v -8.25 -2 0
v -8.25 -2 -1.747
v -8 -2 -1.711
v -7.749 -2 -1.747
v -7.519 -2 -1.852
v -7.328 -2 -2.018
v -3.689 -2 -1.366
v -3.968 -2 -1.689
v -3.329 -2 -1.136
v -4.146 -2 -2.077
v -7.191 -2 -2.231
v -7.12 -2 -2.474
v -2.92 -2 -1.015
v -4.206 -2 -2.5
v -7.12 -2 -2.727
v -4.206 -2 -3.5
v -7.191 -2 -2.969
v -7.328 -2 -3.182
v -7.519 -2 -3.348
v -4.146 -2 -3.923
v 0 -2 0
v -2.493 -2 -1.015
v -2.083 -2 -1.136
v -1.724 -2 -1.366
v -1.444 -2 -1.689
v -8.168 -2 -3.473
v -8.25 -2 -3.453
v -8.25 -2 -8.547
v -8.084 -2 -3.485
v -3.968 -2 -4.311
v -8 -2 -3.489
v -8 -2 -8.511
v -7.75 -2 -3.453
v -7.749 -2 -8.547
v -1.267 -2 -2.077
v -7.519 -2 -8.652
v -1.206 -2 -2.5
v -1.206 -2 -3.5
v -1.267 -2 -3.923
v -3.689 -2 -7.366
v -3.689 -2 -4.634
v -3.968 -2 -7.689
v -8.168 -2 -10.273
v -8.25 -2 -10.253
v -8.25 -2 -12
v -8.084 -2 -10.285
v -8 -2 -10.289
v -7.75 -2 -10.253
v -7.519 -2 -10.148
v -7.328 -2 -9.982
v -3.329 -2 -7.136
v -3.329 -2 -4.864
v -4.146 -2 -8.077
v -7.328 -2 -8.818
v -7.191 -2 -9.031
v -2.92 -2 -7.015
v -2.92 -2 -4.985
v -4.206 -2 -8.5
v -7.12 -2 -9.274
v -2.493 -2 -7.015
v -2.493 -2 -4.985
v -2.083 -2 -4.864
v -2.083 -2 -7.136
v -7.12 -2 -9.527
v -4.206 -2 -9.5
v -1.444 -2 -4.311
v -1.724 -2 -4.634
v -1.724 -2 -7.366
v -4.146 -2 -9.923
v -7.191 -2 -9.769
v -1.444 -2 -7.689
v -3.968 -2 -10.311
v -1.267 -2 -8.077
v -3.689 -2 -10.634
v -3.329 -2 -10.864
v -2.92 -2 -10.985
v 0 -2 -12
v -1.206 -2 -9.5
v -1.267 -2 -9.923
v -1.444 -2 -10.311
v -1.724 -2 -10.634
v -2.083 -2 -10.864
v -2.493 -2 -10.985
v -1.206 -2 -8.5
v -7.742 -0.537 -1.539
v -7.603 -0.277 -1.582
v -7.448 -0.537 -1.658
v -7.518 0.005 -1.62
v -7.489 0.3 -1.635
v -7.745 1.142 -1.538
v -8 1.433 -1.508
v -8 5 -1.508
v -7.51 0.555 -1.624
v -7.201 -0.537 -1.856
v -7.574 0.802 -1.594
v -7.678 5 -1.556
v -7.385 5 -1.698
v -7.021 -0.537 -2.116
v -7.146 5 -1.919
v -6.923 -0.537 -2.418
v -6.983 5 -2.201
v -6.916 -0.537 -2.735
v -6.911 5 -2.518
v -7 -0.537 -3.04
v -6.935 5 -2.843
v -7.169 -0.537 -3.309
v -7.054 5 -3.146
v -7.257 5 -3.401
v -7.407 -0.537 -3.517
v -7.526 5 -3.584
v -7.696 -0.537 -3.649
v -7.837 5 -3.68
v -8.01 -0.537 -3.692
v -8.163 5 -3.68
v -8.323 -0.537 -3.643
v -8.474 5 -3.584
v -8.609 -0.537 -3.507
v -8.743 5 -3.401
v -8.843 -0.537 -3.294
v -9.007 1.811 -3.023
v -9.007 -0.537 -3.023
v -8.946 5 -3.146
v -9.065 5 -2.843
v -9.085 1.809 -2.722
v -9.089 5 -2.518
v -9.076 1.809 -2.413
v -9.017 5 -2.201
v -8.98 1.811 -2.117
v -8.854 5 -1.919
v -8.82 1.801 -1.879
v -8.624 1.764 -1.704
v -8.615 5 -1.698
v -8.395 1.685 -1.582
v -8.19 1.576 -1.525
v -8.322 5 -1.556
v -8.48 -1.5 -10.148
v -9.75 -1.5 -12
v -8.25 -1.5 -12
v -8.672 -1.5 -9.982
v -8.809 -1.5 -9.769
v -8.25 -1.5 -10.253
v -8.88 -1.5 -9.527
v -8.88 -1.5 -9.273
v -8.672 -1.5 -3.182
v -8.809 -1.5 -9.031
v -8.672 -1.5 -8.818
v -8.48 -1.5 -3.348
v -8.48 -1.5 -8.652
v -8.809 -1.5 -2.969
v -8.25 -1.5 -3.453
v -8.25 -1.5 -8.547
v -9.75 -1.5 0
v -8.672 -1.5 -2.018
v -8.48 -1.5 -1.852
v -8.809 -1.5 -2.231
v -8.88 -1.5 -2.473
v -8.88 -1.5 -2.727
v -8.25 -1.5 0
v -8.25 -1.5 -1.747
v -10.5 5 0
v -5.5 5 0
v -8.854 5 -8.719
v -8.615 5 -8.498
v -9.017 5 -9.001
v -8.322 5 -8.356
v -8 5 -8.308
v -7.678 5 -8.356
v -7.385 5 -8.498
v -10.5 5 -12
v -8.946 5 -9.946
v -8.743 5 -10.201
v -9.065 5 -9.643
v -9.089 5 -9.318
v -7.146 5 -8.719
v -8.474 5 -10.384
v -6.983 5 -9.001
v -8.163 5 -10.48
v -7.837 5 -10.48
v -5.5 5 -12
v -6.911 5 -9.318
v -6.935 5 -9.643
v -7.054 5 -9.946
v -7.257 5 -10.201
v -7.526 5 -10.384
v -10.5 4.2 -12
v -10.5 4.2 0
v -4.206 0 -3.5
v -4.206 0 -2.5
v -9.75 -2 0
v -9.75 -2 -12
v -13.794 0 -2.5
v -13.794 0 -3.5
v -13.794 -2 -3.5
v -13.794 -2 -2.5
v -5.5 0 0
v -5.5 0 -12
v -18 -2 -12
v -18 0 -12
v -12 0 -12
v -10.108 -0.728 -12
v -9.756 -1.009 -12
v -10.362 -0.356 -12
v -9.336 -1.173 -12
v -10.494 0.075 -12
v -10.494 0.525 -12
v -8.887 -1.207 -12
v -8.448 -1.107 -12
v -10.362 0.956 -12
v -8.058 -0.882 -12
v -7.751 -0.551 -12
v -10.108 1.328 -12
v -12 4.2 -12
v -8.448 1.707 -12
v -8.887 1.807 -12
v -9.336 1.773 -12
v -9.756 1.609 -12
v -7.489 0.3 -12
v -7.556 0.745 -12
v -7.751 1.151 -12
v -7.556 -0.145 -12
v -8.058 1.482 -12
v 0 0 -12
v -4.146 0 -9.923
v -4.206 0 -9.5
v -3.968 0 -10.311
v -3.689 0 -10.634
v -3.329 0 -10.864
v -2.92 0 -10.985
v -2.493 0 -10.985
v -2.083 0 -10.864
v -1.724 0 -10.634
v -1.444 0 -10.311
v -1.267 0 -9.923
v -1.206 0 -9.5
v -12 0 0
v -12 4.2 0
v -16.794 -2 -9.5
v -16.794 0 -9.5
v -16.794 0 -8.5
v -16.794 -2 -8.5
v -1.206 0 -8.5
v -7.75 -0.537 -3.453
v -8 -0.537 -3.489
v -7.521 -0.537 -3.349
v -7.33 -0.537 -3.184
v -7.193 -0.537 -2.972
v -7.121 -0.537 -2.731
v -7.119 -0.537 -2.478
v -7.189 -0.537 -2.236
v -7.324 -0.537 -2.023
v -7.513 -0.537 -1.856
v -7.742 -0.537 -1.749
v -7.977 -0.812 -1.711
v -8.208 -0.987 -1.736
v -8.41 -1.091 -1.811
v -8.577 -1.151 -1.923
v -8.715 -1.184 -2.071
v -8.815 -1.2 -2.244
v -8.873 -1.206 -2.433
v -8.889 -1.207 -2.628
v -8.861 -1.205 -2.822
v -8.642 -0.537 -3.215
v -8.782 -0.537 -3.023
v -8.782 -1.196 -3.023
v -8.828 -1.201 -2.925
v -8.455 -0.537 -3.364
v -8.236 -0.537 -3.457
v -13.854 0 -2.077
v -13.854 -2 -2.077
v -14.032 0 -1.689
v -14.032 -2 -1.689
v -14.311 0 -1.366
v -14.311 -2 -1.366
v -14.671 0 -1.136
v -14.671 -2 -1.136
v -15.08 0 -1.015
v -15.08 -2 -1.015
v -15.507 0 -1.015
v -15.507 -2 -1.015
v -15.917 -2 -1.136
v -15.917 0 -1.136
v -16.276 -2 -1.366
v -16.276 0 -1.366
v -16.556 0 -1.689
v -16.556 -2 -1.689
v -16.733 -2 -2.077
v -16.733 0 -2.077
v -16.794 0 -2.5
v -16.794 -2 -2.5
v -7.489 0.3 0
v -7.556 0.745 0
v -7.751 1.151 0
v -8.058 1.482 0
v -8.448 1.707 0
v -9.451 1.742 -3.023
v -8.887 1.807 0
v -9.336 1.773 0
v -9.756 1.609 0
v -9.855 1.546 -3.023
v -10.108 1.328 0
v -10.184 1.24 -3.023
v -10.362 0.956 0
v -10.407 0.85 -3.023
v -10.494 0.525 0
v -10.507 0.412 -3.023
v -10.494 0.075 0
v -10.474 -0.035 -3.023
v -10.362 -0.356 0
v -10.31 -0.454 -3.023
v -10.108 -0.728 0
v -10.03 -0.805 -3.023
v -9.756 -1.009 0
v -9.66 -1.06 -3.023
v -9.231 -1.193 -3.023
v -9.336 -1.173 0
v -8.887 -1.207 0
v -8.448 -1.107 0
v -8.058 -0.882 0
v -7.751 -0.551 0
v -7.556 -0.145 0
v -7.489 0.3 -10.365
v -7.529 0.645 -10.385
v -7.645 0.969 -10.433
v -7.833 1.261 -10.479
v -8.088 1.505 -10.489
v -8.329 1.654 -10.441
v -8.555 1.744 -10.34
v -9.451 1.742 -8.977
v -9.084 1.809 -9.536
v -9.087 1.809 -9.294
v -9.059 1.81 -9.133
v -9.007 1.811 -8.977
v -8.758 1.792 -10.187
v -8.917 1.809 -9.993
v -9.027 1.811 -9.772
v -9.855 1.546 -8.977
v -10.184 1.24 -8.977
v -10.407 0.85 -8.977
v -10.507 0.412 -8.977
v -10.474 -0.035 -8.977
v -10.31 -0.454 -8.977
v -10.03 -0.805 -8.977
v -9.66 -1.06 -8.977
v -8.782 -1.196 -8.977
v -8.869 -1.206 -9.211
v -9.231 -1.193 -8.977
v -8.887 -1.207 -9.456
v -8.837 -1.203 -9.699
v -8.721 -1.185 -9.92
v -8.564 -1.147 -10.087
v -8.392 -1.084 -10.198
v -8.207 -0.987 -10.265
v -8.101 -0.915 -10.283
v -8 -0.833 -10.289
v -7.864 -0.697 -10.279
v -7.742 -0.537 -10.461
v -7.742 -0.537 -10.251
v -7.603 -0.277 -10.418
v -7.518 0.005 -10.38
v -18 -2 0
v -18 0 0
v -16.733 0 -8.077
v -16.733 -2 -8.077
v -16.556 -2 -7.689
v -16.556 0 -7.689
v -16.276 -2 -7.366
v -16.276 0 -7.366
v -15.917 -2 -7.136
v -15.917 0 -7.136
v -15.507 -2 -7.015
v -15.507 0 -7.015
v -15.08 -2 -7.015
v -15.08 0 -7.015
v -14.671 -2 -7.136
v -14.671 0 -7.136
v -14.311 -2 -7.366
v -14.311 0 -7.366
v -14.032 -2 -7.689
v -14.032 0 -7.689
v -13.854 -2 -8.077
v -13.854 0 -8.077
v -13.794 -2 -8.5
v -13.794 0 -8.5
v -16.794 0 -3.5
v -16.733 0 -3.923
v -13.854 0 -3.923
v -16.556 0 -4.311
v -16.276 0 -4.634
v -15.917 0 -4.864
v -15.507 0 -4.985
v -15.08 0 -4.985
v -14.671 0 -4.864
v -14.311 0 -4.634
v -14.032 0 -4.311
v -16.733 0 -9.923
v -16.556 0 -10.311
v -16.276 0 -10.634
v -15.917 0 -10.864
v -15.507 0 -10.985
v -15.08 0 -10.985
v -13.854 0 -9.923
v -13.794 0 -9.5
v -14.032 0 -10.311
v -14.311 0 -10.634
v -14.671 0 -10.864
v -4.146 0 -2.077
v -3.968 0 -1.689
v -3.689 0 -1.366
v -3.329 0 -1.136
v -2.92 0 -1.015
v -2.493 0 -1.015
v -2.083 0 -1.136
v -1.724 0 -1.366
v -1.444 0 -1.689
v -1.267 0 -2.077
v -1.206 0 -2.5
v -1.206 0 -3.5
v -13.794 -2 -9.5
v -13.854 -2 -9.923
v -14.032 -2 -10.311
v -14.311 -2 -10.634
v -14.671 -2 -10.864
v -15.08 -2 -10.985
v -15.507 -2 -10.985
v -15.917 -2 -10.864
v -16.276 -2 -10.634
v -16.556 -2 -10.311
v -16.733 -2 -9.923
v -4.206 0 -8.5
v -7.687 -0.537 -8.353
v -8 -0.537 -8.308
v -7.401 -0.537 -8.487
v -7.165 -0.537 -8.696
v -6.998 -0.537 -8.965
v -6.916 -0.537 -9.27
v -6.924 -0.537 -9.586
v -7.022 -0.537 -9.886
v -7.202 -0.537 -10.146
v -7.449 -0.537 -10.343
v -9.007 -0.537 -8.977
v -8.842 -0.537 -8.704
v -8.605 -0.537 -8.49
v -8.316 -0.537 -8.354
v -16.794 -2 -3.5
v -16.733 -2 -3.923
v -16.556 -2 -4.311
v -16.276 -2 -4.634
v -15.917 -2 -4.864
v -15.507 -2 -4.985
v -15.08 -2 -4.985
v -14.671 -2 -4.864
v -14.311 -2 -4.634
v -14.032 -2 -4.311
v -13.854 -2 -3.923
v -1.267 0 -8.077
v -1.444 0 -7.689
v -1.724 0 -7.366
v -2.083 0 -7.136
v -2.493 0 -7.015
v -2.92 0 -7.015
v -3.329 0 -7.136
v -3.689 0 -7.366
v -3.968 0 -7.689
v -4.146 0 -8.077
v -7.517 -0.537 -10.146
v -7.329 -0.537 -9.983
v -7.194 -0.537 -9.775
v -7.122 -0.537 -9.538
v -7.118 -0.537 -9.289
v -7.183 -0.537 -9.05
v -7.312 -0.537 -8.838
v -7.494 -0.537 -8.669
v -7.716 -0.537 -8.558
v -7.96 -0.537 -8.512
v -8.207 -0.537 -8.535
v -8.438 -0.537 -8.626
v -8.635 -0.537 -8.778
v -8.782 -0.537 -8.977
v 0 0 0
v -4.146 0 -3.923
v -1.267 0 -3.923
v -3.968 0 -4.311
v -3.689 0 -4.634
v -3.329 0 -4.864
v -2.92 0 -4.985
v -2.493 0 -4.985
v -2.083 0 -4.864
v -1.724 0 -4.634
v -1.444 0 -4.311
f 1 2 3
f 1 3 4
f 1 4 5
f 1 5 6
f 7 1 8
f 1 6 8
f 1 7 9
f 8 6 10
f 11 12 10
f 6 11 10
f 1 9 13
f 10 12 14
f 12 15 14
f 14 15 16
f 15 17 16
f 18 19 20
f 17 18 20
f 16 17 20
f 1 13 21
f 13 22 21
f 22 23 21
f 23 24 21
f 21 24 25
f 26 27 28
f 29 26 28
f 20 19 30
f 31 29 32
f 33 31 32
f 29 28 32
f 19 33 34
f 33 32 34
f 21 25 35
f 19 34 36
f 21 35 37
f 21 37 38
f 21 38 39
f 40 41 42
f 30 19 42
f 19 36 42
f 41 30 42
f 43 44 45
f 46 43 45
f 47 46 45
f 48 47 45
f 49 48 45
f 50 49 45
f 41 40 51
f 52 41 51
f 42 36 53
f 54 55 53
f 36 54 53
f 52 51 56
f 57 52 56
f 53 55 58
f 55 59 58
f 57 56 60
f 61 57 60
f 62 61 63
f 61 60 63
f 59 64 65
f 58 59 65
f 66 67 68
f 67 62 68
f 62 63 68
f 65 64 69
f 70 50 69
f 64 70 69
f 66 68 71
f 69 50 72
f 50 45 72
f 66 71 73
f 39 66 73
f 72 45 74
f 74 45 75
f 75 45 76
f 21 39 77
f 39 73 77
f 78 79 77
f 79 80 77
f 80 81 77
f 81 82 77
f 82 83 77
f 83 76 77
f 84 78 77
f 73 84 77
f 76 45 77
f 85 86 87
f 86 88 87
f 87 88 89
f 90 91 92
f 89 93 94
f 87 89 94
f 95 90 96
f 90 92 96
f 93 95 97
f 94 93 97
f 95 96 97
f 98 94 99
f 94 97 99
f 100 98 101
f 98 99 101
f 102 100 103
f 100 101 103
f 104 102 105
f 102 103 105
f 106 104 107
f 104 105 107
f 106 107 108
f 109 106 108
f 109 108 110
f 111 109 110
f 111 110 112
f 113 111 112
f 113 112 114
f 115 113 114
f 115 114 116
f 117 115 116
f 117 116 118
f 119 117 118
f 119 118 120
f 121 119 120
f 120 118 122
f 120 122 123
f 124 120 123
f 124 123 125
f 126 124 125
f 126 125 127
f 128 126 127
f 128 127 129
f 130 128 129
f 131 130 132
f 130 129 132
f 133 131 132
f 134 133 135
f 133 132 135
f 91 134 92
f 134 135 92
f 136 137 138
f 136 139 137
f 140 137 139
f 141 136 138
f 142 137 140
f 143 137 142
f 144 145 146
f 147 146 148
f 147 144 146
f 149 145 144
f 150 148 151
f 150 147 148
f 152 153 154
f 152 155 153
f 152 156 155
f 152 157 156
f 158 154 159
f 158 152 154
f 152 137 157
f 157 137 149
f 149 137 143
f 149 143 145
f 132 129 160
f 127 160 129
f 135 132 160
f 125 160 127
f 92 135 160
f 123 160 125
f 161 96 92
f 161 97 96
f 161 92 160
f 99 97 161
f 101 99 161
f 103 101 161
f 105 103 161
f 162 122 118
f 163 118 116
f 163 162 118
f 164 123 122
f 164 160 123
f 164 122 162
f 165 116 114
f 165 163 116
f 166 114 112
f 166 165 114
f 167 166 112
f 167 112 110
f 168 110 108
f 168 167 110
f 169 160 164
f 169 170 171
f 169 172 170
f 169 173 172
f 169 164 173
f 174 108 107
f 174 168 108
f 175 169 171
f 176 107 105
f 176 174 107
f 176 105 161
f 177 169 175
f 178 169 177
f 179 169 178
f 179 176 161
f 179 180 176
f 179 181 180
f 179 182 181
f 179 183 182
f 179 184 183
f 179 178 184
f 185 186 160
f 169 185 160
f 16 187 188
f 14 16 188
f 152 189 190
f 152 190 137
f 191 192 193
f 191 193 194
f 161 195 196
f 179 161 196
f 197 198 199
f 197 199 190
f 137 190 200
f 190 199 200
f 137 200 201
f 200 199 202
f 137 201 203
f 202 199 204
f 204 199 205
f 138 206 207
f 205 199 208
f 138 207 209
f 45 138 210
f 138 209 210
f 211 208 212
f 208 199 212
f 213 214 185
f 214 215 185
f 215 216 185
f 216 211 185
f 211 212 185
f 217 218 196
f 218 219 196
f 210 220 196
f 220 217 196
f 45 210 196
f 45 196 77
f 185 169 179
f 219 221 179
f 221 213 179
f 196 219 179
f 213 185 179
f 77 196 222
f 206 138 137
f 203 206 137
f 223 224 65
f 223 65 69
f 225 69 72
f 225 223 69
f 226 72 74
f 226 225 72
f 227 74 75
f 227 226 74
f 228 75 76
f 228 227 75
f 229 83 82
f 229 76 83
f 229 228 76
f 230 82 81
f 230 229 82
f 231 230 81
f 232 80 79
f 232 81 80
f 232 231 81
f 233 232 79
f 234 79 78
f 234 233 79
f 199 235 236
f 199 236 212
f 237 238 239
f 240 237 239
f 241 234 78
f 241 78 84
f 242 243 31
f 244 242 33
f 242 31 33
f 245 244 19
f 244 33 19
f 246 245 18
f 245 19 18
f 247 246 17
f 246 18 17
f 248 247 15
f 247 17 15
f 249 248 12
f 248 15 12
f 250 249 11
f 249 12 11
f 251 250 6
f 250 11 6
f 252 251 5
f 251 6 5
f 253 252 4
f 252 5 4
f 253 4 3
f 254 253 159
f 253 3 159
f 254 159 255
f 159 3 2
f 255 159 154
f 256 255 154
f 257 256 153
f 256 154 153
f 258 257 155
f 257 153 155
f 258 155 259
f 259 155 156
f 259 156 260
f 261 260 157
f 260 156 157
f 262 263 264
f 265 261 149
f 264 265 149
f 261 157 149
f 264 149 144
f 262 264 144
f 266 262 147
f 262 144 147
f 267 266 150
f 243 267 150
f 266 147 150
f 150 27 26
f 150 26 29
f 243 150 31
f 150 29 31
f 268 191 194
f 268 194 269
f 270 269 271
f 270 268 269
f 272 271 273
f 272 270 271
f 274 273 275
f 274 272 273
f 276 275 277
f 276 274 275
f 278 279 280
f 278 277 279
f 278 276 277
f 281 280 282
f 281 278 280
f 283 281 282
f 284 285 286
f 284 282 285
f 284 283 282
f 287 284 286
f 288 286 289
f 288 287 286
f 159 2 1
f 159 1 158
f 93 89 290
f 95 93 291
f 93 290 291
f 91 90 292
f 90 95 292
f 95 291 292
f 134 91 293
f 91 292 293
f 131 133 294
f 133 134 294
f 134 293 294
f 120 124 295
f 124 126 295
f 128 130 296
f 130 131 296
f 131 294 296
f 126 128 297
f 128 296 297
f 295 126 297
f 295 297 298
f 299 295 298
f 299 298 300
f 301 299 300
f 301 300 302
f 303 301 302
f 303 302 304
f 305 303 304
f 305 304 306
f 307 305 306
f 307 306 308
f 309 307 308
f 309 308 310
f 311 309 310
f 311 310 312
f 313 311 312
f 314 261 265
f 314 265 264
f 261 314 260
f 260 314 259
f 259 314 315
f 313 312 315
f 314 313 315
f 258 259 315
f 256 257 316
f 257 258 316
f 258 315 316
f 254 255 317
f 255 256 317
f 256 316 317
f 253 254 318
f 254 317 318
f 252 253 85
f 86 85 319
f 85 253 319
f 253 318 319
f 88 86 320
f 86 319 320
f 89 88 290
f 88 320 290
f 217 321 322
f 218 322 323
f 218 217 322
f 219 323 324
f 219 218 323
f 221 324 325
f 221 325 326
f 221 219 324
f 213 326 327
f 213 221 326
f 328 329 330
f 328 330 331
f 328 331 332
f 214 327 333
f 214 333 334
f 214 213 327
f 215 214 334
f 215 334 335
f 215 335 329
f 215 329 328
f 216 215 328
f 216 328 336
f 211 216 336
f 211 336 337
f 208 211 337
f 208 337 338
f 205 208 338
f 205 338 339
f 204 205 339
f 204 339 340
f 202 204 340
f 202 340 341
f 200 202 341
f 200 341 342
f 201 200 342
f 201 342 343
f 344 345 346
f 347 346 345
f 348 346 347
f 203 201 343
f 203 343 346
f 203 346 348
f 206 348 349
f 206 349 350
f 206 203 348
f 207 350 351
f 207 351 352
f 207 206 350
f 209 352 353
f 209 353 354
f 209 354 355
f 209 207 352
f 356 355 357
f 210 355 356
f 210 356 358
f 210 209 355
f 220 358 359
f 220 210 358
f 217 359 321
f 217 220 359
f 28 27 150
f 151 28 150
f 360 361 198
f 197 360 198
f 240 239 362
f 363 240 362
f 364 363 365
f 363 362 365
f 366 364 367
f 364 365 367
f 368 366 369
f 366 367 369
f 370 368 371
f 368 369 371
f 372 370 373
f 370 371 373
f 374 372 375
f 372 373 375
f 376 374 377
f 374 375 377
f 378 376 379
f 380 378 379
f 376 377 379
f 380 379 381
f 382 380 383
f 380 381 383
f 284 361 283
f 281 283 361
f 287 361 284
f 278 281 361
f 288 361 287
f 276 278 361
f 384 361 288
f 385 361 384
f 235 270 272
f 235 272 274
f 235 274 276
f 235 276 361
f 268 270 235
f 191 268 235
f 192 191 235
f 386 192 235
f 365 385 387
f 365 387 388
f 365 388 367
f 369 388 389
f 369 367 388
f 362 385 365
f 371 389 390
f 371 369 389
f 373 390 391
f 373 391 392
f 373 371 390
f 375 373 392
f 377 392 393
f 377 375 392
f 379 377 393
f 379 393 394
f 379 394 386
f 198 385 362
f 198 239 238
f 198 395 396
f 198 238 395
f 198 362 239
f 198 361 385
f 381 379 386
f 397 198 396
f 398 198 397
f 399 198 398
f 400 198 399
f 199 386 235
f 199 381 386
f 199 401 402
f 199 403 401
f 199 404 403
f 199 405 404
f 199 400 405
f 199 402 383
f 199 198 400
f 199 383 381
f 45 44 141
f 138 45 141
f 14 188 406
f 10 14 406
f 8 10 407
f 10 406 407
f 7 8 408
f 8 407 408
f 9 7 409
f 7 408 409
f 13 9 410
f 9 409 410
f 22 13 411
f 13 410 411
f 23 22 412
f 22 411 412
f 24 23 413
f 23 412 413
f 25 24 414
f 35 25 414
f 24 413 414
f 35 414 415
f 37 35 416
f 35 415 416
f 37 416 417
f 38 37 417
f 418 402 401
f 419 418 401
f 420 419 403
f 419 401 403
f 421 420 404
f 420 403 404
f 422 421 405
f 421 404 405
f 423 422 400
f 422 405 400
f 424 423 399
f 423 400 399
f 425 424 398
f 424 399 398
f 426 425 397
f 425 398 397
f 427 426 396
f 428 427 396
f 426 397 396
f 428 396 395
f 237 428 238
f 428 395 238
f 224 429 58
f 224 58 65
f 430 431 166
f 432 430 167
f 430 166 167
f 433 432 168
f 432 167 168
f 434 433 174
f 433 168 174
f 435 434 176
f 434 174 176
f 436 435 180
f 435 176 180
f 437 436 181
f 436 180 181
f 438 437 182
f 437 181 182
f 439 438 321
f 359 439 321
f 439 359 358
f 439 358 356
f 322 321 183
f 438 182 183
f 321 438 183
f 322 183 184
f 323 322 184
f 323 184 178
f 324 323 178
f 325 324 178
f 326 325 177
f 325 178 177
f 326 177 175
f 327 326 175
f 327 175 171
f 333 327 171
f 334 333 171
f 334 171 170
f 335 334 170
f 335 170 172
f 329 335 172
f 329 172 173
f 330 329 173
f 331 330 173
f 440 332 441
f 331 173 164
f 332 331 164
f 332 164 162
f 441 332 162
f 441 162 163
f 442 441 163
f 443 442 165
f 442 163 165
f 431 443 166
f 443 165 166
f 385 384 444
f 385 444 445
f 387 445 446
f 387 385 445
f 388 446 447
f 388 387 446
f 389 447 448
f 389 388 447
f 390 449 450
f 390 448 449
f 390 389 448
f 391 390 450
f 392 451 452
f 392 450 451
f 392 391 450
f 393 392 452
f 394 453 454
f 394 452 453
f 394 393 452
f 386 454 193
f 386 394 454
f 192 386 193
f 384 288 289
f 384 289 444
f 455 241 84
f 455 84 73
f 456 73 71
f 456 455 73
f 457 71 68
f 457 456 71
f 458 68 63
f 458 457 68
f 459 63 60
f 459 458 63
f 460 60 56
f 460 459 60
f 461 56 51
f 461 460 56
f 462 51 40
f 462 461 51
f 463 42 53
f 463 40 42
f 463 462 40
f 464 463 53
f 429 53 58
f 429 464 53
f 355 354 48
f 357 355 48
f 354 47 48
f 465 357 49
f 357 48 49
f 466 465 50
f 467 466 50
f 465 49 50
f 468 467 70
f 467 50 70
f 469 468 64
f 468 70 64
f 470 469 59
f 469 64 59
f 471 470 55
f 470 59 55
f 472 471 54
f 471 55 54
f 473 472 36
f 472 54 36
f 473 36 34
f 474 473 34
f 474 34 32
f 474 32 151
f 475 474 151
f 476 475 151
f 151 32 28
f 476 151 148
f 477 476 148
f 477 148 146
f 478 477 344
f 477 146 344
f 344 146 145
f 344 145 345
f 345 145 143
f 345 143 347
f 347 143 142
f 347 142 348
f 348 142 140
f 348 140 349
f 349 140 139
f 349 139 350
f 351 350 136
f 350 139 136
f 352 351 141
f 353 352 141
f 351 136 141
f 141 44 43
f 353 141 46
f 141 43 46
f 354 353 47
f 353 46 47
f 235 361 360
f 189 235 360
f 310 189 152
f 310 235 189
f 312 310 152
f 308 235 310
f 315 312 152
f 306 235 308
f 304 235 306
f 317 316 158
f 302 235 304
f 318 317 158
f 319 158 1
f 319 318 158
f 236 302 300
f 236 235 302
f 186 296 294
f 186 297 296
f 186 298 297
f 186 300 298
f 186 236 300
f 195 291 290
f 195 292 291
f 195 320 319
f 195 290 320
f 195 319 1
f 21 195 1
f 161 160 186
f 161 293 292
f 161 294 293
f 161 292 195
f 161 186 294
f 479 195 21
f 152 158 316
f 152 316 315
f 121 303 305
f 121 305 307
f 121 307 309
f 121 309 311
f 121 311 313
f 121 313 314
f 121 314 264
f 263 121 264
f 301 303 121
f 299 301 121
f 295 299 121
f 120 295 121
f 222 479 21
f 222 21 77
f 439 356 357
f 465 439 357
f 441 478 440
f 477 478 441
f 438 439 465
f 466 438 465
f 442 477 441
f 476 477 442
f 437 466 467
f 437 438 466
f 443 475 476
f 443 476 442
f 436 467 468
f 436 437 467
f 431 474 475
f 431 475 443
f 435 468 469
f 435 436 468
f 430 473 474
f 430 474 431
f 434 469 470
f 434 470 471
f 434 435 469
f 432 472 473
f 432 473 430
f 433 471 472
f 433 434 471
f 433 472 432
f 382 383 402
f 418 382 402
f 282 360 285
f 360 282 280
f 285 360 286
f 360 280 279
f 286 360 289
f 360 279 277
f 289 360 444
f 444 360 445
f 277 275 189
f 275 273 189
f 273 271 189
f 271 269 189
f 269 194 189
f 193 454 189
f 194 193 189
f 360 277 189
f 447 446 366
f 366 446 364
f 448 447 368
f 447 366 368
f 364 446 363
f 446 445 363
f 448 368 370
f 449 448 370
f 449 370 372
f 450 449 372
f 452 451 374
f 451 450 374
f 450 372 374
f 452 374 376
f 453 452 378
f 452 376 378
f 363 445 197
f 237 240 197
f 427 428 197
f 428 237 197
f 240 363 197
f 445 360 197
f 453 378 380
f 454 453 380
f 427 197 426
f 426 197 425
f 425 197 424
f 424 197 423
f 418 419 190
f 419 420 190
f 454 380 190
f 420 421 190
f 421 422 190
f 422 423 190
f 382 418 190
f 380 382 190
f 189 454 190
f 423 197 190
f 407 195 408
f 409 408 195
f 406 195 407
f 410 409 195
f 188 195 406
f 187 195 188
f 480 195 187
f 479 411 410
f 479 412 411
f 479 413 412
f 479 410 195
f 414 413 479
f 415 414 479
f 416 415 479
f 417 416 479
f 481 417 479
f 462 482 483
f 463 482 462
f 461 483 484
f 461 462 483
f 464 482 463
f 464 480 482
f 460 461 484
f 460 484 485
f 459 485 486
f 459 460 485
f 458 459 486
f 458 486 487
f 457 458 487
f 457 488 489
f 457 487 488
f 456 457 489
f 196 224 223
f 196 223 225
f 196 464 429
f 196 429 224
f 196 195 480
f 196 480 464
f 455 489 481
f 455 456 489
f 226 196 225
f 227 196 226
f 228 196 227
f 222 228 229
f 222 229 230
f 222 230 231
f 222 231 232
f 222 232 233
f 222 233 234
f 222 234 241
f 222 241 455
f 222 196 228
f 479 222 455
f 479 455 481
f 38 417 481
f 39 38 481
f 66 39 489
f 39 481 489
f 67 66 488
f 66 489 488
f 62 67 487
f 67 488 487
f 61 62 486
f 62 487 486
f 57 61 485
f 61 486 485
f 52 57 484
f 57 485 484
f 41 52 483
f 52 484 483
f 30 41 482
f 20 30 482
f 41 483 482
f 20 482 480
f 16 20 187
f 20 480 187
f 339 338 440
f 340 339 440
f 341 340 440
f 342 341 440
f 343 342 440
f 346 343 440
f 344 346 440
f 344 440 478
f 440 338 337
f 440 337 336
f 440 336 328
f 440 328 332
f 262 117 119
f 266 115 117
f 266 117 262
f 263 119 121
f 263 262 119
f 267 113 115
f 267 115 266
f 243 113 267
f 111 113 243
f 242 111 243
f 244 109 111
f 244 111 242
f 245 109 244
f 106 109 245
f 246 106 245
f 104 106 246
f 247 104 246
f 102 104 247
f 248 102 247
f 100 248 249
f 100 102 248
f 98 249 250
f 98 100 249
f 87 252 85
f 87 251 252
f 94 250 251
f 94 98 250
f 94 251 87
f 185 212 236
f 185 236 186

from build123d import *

# Parameters (mm, degrees)
SKETCH1_W                       = 18
SKETCH1_H                       = 12
EXTRUDE1_DEPTH                  = 2
SKETCH2_W                       = 1.5
SKETCH2_H                       = 0.5
EXTRUDE2_DEPTH                  = 13
EXTRUDE3_DEPTH                  = 3
MIRROR2_COPY_1_DEPTH            = 3
SKETCH4_W                       = 6.5
SKETCH4_H                       = 12
EXTRUDE4_DEPTH                  = 5
SKETCH5_W                       = 1.5
SKETCH5_H                       = 0.8
EXTRUDE5_DEPTH                  = 13
F_2_56_TAPPED_HOLE1_D           = 1.778
F_2_56_TAPPED_HOLE1_DEPTH       = 9.4488
F_2_56_TAPPED_HOLE1_CBORE_D     = 2.1844
F_2_56_TAPPED_HOLE1_CBORE_DEPTH = 5.5372
F_2_56_TAPPED_HOLE1_TIP         = 0.53416509
SKETCH7_R                       = 1.5113
EXTRUDE6_DEPTH                  = 3.0226


with BuildPart() as part:
    # Sketch1 → Extrude1 (new body)
    with BuildSketch(Plane(origin=(0, 0, 0), x_dir=(1, 0, 0), z_dir=(0, 1, 0))):
        with Locations((-9, 6)):
            Rectangle(SKETCH1_W, SKETCH1_H)
    extrude(amount=-EXTRUDE1_DEPTH)

    # Sketch2 → Extrude2 (cut, through all)
    with BuildSketch(Plane.XY):
        with Locations((-9, -1.75)):
            Rectangle(SKETCH2_W, SKETCH2_H)
    extrude(amount=-EXTRUDE2_DEPTH, mode=Mode.SUBTRACT)

    # Sketch3 → Extrude3 (cut, through all)
    with BuildSketch(Plane(origin=(0, 0, 0), x_dir=(1, 0, 0), z_dir=(0, 1, 0))):
        with BuildLine():
            Line((-16.793731354, 2.5), (-16.793731354, 3.5))
            ThreePointArc((-16.793731354, 3.5), (-15.293731354, 5), (-13.793731354, 3.5))
            Line((-13.793731354, 3.5), (-13.793731354, 2.5))
            ThreePointArc((-13.793731354, 2.5), (-15.293731354, 1), (-16.793731354, 2.5))
        make_face()
    extrude3 = extrude(amount=-EXTRUDE3_DEPTH, mode=Mode.SUBTRACT)

    # Mirror1: Extrude3 across plane
    add(extrude3.mirror(Plane(origin=(0, 0, -6), x_dir=(1, 0, 0), z_dir=(0, 0, -1))), mode=Mode.SUBTRACT)

    # Mirror2: Extrude3 across plane
    add(extrude3.mirror(Plane(origin=(-9, 0, 0), x_dir=(0, 0, 1), z_dir=(1, 0, 0))), mode=Mode.SUBTRACT)

    # Mirror2 copy 1 sketch → Mirror2 copy 1 (cut, through all)
    with BuildSketch(Plane(origin=(-18, 0, -12), x_dir=(-1, 0, 0), z_dir=(0, 1, 0))):
        with BuildLine():
            Line((-16.793731354, 2.5), (-16.793731354, 3.5))
            ThreePointArc((-16.793731354, 3.5), (-15.293731354, 5), (-13.793731354, 3.5))
            Line((-13.793731354, 3.5), (-13.793731354, 2.5))
            ThreePointArc((-13.793731354, 2.5), (-15.293731354, 1), (-16.793731354, 2.5))
        make_face()
    extrude(amount=-MIRROR2_COPY_1_DEPTH, mode=Mode.SUBTRACT)

    # Sketch4 → Extrude4 (add)
    with BuildSketch(Plane(origin=(0, 0, 0), x_dir=(1, 0, 0), z_dir=(0, 1, 0))):
        with Locations((-8.75, 6)):
            Rectangle(SKETCH4_W, SKETCH4_H)
    extrude(amount=EXTRUDE4_DEPTH)

    # Sketch5 → Extrude5 (cut, through all)
    with BuildSketch(Plane.XY):
        with Locations((-11.25, 4.6)):
            Rectangle(SKETCH5_W, SKETCH5_H)
    extrude(amount=-EXTRUDE5_DEPTH, mode=Mode.SUBTRACT)

    # #2-56 Tapped Hole1
    with Locations(Plane(origin=(-8, 5, -2.6), x_dir=(0, 0, 1), z_dir=(0, 1, 0))):
        with Locations((0, 0), (-6.8, 0)):
            CounterBoreHole(F_2_56_TAPPED_HOLE1_D / 2, F_2_56_TAPPED_HOLE1_CBORE_D / 2, F_2_56_TAPPED_HOLE1_CBORE_DEPTH, depth=F_2_56_TAPPED_HOLE1_DEPTH)
            with Locations((0, 0, -(F_2_56_TAPPED_HOLE1_DEPTH + F_2_56_TAPPED_HOLE1_TIP / 2))):  # 118° drill point
                Cone(0, F_2_56_TAPPED_HOLE1_D / 2, F_2_56_TAPPED_HOLE1_TIP, mode=Mode.SUBTRACT)

    # Sketch7 → Extrude6 (cut)
    with BuildSketch(Plane.XY):
        with Locations((-9, 0.3)):
            Circle(SKETCH7_R)
    extrude6 = extrude(amount=-EXTRUDE6_DEPTH, mode=Mode.SUBTRACT)

    # Mirror3: Extrude6 across plane
    add(extrude6.mirror(Plane(origin=(0, 0, -6), x_dir=(1, 0, 0), z_dir=(0, 0, -1))), mode=Mode.SUBTRACT)


solid = part.part
